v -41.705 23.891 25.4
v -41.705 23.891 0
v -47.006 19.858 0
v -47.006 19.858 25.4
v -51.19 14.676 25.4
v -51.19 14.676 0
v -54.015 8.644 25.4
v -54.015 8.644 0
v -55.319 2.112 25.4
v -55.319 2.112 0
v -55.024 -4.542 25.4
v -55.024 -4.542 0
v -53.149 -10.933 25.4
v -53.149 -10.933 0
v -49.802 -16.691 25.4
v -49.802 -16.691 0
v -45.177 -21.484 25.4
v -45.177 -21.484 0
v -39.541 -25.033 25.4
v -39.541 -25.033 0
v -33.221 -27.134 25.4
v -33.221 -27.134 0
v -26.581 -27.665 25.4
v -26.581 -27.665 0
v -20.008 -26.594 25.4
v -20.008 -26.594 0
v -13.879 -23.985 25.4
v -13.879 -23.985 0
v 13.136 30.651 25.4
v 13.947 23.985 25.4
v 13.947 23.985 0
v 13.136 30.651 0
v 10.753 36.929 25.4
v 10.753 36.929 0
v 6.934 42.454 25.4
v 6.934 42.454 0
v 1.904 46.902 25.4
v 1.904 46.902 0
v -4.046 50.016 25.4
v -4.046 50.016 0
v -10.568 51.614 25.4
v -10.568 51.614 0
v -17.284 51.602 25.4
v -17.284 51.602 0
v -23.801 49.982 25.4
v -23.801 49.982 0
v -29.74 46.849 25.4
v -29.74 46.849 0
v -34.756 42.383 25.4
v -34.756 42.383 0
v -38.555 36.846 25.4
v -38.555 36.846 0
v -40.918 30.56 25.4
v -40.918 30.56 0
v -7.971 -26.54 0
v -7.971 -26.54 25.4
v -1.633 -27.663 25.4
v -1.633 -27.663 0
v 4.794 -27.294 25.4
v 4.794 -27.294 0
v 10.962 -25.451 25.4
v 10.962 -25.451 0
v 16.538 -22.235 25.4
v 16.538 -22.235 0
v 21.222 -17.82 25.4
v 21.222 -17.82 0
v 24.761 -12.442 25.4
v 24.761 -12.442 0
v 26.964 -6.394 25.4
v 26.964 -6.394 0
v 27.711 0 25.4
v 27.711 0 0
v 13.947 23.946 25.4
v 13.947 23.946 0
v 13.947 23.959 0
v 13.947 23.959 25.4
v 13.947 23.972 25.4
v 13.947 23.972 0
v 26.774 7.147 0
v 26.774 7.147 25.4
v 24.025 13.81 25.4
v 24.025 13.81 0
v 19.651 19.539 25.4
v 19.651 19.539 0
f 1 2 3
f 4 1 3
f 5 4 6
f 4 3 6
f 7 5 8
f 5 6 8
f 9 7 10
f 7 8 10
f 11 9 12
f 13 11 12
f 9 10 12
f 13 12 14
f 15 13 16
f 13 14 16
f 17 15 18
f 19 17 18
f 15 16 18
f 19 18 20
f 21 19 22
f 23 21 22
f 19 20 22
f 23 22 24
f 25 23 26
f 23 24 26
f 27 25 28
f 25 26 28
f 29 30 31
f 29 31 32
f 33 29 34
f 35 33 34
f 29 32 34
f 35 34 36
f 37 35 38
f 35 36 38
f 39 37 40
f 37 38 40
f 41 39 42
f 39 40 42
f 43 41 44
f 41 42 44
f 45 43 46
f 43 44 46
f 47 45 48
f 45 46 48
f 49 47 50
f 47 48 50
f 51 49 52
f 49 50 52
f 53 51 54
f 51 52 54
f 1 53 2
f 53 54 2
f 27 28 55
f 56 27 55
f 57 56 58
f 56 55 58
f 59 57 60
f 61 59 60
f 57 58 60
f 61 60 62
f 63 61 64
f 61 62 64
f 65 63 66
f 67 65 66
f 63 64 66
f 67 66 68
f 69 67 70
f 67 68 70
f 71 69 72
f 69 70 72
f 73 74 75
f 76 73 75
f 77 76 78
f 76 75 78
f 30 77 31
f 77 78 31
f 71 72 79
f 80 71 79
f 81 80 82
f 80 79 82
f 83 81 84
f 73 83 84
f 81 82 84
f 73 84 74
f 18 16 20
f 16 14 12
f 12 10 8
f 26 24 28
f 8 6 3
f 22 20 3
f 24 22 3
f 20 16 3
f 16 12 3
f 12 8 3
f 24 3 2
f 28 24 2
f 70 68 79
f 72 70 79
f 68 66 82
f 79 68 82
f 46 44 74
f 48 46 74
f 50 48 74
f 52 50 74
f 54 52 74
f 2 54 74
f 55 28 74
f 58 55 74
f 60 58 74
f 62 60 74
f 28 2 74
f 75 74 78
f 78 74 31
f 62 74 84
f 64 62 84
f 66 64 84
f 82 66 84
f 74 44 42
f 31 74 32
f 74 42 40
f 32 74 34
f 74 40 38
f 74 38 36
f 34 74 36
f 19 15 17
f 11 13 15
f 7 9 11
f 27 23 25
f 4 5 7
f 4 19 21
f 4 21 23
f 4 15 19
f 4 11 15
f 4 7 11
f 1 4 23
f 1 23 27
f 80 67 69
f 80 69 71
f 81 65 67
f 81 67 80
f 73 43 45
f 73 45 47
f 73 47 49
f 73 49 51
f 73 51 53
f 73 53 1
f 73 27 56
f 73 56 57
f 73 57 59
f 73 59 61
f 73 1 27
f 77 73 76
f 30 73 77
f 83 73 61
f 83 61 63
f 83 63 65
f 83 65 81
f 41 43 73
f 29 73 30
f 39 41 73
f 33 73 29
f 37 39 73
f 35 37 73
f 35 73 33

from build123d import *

# Parameters (mm, degrees)
F1_DEPTH = 25.4


with BuildPart() as f1:
    # F0 (on Top) → F1 (new body)
    with BuildSketch(Plane.XY):
        with BuildLine():
            ThreePointArc((-13.8794476694, 23.9851492257), (0.0388587333, 27.7114586585), (13.946659894, 23.9461297245))
            ThreePointArc((13.946659894, 23.9461297245), (13.9466804124, 23.9656394703), (13.9466872518, 23.9851492257))
            ThreePointArc((13.9466872518, 23.9851492257), (-13.9264962423, 51.8112443718), (-41.7054234906, 23.8910522142))
            ThreePointArc((-41.7054234906, 23.8910522142), (-27.805115023, 27.6876127299), (-13.8794476694, 23.9851492257))
        make_face()
        with BuildLine():
            ThreePointArc((-27.7110248308, -0.1598555968), (-24.0455227676, 13.7745884083), (-13.8794476694, 23.9851492257))
            ThreePointArc((-13.8794476694, 23.9851492257), (-27.805115023, 27.6876127299), (-41.7054234906, 23.8910522142))
            ThreePointArc((-41.7054234906, 23.8910522142), (-37.9304241934, 9.9907105841), (-27.7110248308, -0.1598555968))
        make_face()
        with BuildLine():
            ThreePointArc((-0.0241009827, -0.1462235666), (10.192242734, 10.026370419), (13.946659894, 23.9461297245))
            ThreePointArc((13.946659894, 23.9461297245), (0.0388587333, 27.7114586585), (-13.8794476694, 23.9851492257))
            ThreePointArc((-13.8794476694, 23.9851492257), (-3.7365930705, 13.8498078951), (-0.0237148649, 0))
            ThreePointArc((-0.0237148649, 0), (-0.0238113945, -0.0731120382), (-0.0241009827, -0.1462235666))
        make_face()
        with BuildLine():
            ThreePointArc((-0.0237148649, 0), (-3.7365930705, 13.8498078951), (-13.8794476694, 23.9851492257))
            ThreePointArc((-13.8794476694, 23.9851492257), (-24.0455227676, 13.7745884083), (-27.7110248308, -0.1598555968))
            ThreePointArc((-27.7110248308, -0.1598555968), (-13.8657470984, -3.8409823227), (-0.0241009827, -0.1462235666))
            ThreePointArc((-0.0241009827, -0.1462235666), (-0.0238113945, -0.0731120382), (-0.0237148649, 0))
        make_face()
        with BuildLine():
            ThreePointArc((-27.7110248308, -0.1598555968), (-23.9656630374, -13.9130674606), (-13.8794476694, -23.9851492257))
            ThreePointArc((-13.8794476694, -23.9851492257), (-3.7732483133, -13.9130674606), (-0.0241009827, -0.1462235666))
            ThreePointArc((-0.0241009827, -0.1462235666), (-13.8657470984, -3.8409823227), (-27.7110248308, -0.1598555968))
        make_face()
        with BuildLine():
            ThreePointArc((-13.8794476694, -23.9851492257), (13.8438855193, -24.0056927563), (27.7114859036, 0))
            ThreePointArc((27.7114859036, 0), (24.0250818941, 13.810209664), (13.946659894, 23.9461297245))
            ThreePointArc((13.946659894, 23.9461297245), (10.192242734, 10.026370419), (-0.0241009827, -0.1462235666))
            ThreePointArc((-0.0241009827, -0.1462235666), (-3.7732483133, -13.9130674606), (-13.8794476694, -23.9851492257))
        make_face()
        with BuildLine():
            ThreePointArc((-41.7054234906, 23.8910522142), (-51.6497234938, -13.9130674606), (-13.8794476694, -23.9851492257))
            ThreePointArc((-13.8794476694, -23.9851492257), (-23.9656630374, -13.9130674606), (-27.7110248308, -0.1598555968))
            ThreePointArc((-27.7110248308, -0.1598555968), (-37.9304241934, 9.9907105841), (-41.7054234906, 23.8910522142))
        make_face()
    extrude(amount=F1_DEPTH)


solid = f1.part
